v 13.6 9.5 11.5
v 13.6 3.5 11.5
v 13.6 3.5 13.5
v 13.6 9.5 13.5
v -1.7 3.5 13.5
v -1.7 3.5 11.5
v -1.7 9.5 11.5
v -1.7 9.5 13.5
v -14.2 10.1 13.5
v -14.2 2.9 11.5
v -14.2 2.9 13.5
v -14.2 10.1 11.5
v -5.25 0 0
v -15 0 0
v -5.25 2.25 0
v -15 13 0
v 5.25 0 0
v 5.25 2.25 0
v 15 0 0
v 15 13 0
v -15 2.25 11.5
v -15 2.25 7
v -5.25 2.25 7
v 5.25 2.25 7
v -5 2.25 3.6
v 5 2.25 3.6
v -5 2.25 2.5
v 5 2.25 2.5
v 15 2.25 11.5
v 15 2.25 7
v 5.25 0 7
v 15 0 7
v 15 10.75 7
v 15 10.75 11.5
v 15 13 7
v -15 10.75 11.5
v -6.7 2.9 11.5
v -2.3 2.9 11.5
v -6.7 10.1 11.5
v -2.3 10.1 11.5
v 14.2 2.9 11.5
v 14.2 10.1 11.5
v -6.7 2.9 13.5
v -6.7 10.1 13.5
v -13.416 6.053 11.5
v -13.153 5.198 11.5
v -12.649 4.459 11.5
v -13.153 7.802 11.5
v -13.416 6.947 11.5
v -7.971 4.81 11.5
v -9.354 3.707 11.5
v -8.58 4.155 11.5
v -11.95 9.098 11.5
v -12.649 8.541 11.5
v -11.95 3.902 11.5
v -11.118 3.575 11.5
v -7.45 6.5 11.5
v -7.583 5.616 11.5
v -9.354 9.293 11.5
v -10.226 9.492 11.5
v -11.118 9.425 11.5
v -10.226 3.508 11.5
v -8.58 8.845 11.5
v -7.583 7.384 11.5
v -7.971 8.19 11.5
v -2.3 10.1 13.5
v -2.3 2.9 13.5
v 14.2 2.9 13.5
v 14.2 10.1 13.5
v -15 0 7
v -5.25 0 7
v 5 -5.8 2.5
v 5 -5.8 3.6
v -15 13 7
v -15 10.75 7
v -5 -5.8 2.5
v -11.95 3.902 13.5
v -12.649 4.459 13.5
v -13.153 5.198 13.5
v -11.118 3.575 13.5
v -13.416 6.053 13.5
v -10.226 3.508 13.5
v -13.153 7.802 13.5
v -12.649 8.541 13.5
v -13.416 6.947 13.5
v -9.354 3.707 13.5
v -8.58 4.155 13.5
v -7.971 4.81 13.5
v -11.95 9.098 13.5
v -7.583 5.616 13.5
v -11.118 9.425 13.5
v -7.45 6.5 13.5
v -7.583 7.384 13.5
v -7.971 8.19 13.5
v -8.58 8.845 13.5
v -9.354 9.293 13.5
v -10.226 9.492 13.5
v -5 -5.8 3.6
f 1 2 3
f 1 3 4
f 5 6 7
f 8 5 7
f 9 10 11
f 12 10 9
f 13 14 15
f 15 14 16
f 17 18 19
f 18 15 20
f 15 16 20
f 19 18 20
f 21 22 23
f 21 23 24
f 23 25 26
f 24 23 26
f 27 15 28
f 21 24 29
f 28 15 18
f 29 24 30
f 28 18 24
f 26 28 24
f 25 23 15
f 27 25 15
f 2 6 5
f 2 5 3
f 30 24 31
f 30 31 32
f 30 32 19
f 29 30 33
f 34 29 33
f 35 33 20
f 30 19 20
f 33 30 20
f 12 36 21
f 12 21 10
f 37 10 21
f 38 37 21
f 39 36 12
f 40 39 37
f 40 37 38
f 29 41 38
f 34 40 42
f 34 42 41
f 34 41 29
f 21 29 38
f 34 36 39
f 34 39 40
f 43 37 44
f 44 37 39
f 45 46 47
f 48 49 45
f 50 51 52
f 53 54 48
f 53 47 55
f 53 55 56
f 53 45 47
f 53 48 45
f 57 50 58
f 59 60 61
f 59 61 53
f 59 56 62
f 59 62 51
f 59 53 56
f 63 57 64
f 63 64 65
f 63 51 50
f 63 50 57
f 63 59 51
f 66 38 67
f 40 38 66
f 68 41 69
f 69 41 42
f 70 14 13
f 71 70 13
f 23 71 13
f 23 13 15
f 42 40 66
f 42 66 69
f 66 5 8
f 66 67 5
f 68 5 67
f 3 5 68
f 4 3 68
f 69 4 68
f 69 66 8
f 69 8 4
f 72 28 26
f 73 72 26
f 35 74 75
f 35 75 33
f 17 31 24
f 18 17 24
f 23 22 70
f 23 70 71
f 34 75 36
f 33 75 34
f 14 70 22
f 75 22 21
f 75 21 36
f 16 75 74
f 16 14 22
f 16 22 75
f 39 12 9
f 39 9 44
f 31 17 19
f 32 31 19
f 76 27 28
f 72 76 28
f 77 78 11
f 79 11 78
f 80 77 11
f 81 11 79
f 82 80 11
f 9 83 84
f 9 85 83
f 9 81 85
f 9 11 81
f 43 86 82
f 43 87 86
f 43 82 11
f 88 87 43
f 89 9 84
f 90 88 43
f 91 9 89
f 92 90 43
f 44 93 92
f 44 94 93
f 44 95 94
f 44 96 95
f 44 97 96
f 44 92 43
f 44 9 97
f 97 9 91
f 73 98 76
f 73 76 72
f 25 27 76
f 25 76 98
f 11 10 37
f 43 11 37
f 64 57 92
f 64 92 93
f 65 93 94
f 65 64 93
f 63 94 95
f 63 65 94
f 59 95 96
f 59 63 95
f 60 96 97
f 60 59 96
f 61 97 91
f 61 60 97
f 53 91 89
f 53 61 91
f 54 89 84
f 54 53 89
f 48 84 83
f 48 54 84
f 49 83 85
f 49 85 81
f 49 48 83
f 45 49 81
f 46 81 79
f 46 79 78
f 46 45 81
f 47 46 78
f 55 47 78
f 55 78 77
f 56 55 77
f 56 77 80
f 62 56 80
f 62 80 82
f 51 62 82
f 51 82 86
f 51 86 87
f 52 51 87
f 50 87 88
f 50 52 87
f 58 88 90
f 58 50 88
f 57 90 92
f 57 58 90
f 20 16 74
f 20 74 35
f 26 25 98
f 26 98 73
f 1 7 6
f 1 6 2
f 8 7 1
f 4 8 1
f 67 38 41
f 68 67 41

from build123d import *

# Parameters (mm, degrees)
SKETCH_1_W          = 30
SKETCH_1_H          = 13
EXTRUDE_1_DEPTH     = 1.4
SKETCH_2_W          = 30
SKETCH_2_H          = 13
EXTRUDE_2_DEPTH     = 4
SKETCH_3_W          = 30
SKETCH_3_H          = 13
EXTRUDE_3_DEPTH     = 1.6
SKETCH_4_W          = 30
SKETCH_4_H          = 8.5
EXTRUDE_4_DEPTH     = 4.5
SKETCH_6_W          = 16.5
SKETCH_6_H          = 7.2
SKETCH_6_W_2        = 15.3
SKETCH_6_H_2        = 6
SKETCH_6_W_3        = 7.5
SKETCH_6_R          = 3
EXTRUDE_5_DEPTH     = 2
SKETCH_7_W          = 10.5
SKETCH_7_H          = 4.5
CUT_EXTRUDE_1_DEPTH = 12
SKETCH_8_W          = 10
SKETCH_8_H          = 1.1
EXTRUDE_6_DEPTH     = 8.05


with BuildPart() as part:
    # Эскиз1 → Бобышка-Вытянуть1 (new body)
    with BuildSketch(Plane.XY):
        with Locations((0, 6.5)):
            Rectangle(SKETCH_1_W, SKETCH_1_H)
    extrude(amount=EXTRUDE_1_DEPTH)

    # Эскиз2 → Бобышка-Вытянуть2 (add)
    with BuildSketch(Plane.XY.offset(1.4)):
        with Locations((0, 6.5)):
            Rectangle(SKETCH_2_W, SKETCH_2_H)
    extrude(amount=EXTRUDE_2_DEPTH)

    # Эскиз3 → Бобышка-Вытянуть3 (add)
    with BuildSketch(Plane.XY.offset(5.4)):
        with Locations((0, 6.5)):
            Rectangle(SKETCH_3_W, SKETCH_3_H)
    extrude(amount=EXTRUDE_3_DEPTH)

    # Эскиз4 → Бобышка-Вытянуть4 (add)
    with BuildSketch(Plane.XY.offset(7)):
        with Locations((0, 6.5)):
            Rectangle(SKETCH_4_W, SKETCH_4_H)
    extrude(amount=EXTRUDE_4_DEPTH)

    # Эскиз6 → Бобышка-Вытянуть5 (add)
    # profile 1 of 2: a face of its own
    with BuildSketch(Plane.XY.offset(11.5)):
        with Locations((5.95, 6.5)):
            Rectangle(SKETCH_6_W, SKETCH_6_H)
        with Locations((5.95, 6.5)):
            Rectangle(SKETCH_6_W_2, SKETCH_6_H_2, mode=Mode.SUBTRACT)
    # profile 2 of 2: a face of its own
    with BuildSketch(Plane.XY.offset(11.5)):
        with Locations((-10.45, 6.5)):
            Rectangle(SKETCH_6_W_3, SKETCH_6_H)
        with Locations((-10.45, 6.5)):
            Circle(SKETCH_6_R, mode=Mode.SUBTRACT)
    extrude(amount=EXTRUDE_5_DEPTH)

    # Эскиз7 → Вырез-Вытянуть1 (cut)
    with BuildSketch(Plane.XY.offset(7)):
        Rectangle(SKETCH_7_W, SKETCH_7_H)
    extrude(amount=-CUT_EXTRUDE_1_DEPTH, mode=Mode.SUBTRACT)

    # Эскиз8 → Бобышка-Вытянуть6 (add)
    with BuildSketch(Plane.XZ.offset(-2.25)):
        with Locations((0, 3.05)):
            Rectangle(SKETCH_8_W, SKETCH_8_H)
    extrude(amount=EXTRUDE_6_DEPTH)


solid = part.part
